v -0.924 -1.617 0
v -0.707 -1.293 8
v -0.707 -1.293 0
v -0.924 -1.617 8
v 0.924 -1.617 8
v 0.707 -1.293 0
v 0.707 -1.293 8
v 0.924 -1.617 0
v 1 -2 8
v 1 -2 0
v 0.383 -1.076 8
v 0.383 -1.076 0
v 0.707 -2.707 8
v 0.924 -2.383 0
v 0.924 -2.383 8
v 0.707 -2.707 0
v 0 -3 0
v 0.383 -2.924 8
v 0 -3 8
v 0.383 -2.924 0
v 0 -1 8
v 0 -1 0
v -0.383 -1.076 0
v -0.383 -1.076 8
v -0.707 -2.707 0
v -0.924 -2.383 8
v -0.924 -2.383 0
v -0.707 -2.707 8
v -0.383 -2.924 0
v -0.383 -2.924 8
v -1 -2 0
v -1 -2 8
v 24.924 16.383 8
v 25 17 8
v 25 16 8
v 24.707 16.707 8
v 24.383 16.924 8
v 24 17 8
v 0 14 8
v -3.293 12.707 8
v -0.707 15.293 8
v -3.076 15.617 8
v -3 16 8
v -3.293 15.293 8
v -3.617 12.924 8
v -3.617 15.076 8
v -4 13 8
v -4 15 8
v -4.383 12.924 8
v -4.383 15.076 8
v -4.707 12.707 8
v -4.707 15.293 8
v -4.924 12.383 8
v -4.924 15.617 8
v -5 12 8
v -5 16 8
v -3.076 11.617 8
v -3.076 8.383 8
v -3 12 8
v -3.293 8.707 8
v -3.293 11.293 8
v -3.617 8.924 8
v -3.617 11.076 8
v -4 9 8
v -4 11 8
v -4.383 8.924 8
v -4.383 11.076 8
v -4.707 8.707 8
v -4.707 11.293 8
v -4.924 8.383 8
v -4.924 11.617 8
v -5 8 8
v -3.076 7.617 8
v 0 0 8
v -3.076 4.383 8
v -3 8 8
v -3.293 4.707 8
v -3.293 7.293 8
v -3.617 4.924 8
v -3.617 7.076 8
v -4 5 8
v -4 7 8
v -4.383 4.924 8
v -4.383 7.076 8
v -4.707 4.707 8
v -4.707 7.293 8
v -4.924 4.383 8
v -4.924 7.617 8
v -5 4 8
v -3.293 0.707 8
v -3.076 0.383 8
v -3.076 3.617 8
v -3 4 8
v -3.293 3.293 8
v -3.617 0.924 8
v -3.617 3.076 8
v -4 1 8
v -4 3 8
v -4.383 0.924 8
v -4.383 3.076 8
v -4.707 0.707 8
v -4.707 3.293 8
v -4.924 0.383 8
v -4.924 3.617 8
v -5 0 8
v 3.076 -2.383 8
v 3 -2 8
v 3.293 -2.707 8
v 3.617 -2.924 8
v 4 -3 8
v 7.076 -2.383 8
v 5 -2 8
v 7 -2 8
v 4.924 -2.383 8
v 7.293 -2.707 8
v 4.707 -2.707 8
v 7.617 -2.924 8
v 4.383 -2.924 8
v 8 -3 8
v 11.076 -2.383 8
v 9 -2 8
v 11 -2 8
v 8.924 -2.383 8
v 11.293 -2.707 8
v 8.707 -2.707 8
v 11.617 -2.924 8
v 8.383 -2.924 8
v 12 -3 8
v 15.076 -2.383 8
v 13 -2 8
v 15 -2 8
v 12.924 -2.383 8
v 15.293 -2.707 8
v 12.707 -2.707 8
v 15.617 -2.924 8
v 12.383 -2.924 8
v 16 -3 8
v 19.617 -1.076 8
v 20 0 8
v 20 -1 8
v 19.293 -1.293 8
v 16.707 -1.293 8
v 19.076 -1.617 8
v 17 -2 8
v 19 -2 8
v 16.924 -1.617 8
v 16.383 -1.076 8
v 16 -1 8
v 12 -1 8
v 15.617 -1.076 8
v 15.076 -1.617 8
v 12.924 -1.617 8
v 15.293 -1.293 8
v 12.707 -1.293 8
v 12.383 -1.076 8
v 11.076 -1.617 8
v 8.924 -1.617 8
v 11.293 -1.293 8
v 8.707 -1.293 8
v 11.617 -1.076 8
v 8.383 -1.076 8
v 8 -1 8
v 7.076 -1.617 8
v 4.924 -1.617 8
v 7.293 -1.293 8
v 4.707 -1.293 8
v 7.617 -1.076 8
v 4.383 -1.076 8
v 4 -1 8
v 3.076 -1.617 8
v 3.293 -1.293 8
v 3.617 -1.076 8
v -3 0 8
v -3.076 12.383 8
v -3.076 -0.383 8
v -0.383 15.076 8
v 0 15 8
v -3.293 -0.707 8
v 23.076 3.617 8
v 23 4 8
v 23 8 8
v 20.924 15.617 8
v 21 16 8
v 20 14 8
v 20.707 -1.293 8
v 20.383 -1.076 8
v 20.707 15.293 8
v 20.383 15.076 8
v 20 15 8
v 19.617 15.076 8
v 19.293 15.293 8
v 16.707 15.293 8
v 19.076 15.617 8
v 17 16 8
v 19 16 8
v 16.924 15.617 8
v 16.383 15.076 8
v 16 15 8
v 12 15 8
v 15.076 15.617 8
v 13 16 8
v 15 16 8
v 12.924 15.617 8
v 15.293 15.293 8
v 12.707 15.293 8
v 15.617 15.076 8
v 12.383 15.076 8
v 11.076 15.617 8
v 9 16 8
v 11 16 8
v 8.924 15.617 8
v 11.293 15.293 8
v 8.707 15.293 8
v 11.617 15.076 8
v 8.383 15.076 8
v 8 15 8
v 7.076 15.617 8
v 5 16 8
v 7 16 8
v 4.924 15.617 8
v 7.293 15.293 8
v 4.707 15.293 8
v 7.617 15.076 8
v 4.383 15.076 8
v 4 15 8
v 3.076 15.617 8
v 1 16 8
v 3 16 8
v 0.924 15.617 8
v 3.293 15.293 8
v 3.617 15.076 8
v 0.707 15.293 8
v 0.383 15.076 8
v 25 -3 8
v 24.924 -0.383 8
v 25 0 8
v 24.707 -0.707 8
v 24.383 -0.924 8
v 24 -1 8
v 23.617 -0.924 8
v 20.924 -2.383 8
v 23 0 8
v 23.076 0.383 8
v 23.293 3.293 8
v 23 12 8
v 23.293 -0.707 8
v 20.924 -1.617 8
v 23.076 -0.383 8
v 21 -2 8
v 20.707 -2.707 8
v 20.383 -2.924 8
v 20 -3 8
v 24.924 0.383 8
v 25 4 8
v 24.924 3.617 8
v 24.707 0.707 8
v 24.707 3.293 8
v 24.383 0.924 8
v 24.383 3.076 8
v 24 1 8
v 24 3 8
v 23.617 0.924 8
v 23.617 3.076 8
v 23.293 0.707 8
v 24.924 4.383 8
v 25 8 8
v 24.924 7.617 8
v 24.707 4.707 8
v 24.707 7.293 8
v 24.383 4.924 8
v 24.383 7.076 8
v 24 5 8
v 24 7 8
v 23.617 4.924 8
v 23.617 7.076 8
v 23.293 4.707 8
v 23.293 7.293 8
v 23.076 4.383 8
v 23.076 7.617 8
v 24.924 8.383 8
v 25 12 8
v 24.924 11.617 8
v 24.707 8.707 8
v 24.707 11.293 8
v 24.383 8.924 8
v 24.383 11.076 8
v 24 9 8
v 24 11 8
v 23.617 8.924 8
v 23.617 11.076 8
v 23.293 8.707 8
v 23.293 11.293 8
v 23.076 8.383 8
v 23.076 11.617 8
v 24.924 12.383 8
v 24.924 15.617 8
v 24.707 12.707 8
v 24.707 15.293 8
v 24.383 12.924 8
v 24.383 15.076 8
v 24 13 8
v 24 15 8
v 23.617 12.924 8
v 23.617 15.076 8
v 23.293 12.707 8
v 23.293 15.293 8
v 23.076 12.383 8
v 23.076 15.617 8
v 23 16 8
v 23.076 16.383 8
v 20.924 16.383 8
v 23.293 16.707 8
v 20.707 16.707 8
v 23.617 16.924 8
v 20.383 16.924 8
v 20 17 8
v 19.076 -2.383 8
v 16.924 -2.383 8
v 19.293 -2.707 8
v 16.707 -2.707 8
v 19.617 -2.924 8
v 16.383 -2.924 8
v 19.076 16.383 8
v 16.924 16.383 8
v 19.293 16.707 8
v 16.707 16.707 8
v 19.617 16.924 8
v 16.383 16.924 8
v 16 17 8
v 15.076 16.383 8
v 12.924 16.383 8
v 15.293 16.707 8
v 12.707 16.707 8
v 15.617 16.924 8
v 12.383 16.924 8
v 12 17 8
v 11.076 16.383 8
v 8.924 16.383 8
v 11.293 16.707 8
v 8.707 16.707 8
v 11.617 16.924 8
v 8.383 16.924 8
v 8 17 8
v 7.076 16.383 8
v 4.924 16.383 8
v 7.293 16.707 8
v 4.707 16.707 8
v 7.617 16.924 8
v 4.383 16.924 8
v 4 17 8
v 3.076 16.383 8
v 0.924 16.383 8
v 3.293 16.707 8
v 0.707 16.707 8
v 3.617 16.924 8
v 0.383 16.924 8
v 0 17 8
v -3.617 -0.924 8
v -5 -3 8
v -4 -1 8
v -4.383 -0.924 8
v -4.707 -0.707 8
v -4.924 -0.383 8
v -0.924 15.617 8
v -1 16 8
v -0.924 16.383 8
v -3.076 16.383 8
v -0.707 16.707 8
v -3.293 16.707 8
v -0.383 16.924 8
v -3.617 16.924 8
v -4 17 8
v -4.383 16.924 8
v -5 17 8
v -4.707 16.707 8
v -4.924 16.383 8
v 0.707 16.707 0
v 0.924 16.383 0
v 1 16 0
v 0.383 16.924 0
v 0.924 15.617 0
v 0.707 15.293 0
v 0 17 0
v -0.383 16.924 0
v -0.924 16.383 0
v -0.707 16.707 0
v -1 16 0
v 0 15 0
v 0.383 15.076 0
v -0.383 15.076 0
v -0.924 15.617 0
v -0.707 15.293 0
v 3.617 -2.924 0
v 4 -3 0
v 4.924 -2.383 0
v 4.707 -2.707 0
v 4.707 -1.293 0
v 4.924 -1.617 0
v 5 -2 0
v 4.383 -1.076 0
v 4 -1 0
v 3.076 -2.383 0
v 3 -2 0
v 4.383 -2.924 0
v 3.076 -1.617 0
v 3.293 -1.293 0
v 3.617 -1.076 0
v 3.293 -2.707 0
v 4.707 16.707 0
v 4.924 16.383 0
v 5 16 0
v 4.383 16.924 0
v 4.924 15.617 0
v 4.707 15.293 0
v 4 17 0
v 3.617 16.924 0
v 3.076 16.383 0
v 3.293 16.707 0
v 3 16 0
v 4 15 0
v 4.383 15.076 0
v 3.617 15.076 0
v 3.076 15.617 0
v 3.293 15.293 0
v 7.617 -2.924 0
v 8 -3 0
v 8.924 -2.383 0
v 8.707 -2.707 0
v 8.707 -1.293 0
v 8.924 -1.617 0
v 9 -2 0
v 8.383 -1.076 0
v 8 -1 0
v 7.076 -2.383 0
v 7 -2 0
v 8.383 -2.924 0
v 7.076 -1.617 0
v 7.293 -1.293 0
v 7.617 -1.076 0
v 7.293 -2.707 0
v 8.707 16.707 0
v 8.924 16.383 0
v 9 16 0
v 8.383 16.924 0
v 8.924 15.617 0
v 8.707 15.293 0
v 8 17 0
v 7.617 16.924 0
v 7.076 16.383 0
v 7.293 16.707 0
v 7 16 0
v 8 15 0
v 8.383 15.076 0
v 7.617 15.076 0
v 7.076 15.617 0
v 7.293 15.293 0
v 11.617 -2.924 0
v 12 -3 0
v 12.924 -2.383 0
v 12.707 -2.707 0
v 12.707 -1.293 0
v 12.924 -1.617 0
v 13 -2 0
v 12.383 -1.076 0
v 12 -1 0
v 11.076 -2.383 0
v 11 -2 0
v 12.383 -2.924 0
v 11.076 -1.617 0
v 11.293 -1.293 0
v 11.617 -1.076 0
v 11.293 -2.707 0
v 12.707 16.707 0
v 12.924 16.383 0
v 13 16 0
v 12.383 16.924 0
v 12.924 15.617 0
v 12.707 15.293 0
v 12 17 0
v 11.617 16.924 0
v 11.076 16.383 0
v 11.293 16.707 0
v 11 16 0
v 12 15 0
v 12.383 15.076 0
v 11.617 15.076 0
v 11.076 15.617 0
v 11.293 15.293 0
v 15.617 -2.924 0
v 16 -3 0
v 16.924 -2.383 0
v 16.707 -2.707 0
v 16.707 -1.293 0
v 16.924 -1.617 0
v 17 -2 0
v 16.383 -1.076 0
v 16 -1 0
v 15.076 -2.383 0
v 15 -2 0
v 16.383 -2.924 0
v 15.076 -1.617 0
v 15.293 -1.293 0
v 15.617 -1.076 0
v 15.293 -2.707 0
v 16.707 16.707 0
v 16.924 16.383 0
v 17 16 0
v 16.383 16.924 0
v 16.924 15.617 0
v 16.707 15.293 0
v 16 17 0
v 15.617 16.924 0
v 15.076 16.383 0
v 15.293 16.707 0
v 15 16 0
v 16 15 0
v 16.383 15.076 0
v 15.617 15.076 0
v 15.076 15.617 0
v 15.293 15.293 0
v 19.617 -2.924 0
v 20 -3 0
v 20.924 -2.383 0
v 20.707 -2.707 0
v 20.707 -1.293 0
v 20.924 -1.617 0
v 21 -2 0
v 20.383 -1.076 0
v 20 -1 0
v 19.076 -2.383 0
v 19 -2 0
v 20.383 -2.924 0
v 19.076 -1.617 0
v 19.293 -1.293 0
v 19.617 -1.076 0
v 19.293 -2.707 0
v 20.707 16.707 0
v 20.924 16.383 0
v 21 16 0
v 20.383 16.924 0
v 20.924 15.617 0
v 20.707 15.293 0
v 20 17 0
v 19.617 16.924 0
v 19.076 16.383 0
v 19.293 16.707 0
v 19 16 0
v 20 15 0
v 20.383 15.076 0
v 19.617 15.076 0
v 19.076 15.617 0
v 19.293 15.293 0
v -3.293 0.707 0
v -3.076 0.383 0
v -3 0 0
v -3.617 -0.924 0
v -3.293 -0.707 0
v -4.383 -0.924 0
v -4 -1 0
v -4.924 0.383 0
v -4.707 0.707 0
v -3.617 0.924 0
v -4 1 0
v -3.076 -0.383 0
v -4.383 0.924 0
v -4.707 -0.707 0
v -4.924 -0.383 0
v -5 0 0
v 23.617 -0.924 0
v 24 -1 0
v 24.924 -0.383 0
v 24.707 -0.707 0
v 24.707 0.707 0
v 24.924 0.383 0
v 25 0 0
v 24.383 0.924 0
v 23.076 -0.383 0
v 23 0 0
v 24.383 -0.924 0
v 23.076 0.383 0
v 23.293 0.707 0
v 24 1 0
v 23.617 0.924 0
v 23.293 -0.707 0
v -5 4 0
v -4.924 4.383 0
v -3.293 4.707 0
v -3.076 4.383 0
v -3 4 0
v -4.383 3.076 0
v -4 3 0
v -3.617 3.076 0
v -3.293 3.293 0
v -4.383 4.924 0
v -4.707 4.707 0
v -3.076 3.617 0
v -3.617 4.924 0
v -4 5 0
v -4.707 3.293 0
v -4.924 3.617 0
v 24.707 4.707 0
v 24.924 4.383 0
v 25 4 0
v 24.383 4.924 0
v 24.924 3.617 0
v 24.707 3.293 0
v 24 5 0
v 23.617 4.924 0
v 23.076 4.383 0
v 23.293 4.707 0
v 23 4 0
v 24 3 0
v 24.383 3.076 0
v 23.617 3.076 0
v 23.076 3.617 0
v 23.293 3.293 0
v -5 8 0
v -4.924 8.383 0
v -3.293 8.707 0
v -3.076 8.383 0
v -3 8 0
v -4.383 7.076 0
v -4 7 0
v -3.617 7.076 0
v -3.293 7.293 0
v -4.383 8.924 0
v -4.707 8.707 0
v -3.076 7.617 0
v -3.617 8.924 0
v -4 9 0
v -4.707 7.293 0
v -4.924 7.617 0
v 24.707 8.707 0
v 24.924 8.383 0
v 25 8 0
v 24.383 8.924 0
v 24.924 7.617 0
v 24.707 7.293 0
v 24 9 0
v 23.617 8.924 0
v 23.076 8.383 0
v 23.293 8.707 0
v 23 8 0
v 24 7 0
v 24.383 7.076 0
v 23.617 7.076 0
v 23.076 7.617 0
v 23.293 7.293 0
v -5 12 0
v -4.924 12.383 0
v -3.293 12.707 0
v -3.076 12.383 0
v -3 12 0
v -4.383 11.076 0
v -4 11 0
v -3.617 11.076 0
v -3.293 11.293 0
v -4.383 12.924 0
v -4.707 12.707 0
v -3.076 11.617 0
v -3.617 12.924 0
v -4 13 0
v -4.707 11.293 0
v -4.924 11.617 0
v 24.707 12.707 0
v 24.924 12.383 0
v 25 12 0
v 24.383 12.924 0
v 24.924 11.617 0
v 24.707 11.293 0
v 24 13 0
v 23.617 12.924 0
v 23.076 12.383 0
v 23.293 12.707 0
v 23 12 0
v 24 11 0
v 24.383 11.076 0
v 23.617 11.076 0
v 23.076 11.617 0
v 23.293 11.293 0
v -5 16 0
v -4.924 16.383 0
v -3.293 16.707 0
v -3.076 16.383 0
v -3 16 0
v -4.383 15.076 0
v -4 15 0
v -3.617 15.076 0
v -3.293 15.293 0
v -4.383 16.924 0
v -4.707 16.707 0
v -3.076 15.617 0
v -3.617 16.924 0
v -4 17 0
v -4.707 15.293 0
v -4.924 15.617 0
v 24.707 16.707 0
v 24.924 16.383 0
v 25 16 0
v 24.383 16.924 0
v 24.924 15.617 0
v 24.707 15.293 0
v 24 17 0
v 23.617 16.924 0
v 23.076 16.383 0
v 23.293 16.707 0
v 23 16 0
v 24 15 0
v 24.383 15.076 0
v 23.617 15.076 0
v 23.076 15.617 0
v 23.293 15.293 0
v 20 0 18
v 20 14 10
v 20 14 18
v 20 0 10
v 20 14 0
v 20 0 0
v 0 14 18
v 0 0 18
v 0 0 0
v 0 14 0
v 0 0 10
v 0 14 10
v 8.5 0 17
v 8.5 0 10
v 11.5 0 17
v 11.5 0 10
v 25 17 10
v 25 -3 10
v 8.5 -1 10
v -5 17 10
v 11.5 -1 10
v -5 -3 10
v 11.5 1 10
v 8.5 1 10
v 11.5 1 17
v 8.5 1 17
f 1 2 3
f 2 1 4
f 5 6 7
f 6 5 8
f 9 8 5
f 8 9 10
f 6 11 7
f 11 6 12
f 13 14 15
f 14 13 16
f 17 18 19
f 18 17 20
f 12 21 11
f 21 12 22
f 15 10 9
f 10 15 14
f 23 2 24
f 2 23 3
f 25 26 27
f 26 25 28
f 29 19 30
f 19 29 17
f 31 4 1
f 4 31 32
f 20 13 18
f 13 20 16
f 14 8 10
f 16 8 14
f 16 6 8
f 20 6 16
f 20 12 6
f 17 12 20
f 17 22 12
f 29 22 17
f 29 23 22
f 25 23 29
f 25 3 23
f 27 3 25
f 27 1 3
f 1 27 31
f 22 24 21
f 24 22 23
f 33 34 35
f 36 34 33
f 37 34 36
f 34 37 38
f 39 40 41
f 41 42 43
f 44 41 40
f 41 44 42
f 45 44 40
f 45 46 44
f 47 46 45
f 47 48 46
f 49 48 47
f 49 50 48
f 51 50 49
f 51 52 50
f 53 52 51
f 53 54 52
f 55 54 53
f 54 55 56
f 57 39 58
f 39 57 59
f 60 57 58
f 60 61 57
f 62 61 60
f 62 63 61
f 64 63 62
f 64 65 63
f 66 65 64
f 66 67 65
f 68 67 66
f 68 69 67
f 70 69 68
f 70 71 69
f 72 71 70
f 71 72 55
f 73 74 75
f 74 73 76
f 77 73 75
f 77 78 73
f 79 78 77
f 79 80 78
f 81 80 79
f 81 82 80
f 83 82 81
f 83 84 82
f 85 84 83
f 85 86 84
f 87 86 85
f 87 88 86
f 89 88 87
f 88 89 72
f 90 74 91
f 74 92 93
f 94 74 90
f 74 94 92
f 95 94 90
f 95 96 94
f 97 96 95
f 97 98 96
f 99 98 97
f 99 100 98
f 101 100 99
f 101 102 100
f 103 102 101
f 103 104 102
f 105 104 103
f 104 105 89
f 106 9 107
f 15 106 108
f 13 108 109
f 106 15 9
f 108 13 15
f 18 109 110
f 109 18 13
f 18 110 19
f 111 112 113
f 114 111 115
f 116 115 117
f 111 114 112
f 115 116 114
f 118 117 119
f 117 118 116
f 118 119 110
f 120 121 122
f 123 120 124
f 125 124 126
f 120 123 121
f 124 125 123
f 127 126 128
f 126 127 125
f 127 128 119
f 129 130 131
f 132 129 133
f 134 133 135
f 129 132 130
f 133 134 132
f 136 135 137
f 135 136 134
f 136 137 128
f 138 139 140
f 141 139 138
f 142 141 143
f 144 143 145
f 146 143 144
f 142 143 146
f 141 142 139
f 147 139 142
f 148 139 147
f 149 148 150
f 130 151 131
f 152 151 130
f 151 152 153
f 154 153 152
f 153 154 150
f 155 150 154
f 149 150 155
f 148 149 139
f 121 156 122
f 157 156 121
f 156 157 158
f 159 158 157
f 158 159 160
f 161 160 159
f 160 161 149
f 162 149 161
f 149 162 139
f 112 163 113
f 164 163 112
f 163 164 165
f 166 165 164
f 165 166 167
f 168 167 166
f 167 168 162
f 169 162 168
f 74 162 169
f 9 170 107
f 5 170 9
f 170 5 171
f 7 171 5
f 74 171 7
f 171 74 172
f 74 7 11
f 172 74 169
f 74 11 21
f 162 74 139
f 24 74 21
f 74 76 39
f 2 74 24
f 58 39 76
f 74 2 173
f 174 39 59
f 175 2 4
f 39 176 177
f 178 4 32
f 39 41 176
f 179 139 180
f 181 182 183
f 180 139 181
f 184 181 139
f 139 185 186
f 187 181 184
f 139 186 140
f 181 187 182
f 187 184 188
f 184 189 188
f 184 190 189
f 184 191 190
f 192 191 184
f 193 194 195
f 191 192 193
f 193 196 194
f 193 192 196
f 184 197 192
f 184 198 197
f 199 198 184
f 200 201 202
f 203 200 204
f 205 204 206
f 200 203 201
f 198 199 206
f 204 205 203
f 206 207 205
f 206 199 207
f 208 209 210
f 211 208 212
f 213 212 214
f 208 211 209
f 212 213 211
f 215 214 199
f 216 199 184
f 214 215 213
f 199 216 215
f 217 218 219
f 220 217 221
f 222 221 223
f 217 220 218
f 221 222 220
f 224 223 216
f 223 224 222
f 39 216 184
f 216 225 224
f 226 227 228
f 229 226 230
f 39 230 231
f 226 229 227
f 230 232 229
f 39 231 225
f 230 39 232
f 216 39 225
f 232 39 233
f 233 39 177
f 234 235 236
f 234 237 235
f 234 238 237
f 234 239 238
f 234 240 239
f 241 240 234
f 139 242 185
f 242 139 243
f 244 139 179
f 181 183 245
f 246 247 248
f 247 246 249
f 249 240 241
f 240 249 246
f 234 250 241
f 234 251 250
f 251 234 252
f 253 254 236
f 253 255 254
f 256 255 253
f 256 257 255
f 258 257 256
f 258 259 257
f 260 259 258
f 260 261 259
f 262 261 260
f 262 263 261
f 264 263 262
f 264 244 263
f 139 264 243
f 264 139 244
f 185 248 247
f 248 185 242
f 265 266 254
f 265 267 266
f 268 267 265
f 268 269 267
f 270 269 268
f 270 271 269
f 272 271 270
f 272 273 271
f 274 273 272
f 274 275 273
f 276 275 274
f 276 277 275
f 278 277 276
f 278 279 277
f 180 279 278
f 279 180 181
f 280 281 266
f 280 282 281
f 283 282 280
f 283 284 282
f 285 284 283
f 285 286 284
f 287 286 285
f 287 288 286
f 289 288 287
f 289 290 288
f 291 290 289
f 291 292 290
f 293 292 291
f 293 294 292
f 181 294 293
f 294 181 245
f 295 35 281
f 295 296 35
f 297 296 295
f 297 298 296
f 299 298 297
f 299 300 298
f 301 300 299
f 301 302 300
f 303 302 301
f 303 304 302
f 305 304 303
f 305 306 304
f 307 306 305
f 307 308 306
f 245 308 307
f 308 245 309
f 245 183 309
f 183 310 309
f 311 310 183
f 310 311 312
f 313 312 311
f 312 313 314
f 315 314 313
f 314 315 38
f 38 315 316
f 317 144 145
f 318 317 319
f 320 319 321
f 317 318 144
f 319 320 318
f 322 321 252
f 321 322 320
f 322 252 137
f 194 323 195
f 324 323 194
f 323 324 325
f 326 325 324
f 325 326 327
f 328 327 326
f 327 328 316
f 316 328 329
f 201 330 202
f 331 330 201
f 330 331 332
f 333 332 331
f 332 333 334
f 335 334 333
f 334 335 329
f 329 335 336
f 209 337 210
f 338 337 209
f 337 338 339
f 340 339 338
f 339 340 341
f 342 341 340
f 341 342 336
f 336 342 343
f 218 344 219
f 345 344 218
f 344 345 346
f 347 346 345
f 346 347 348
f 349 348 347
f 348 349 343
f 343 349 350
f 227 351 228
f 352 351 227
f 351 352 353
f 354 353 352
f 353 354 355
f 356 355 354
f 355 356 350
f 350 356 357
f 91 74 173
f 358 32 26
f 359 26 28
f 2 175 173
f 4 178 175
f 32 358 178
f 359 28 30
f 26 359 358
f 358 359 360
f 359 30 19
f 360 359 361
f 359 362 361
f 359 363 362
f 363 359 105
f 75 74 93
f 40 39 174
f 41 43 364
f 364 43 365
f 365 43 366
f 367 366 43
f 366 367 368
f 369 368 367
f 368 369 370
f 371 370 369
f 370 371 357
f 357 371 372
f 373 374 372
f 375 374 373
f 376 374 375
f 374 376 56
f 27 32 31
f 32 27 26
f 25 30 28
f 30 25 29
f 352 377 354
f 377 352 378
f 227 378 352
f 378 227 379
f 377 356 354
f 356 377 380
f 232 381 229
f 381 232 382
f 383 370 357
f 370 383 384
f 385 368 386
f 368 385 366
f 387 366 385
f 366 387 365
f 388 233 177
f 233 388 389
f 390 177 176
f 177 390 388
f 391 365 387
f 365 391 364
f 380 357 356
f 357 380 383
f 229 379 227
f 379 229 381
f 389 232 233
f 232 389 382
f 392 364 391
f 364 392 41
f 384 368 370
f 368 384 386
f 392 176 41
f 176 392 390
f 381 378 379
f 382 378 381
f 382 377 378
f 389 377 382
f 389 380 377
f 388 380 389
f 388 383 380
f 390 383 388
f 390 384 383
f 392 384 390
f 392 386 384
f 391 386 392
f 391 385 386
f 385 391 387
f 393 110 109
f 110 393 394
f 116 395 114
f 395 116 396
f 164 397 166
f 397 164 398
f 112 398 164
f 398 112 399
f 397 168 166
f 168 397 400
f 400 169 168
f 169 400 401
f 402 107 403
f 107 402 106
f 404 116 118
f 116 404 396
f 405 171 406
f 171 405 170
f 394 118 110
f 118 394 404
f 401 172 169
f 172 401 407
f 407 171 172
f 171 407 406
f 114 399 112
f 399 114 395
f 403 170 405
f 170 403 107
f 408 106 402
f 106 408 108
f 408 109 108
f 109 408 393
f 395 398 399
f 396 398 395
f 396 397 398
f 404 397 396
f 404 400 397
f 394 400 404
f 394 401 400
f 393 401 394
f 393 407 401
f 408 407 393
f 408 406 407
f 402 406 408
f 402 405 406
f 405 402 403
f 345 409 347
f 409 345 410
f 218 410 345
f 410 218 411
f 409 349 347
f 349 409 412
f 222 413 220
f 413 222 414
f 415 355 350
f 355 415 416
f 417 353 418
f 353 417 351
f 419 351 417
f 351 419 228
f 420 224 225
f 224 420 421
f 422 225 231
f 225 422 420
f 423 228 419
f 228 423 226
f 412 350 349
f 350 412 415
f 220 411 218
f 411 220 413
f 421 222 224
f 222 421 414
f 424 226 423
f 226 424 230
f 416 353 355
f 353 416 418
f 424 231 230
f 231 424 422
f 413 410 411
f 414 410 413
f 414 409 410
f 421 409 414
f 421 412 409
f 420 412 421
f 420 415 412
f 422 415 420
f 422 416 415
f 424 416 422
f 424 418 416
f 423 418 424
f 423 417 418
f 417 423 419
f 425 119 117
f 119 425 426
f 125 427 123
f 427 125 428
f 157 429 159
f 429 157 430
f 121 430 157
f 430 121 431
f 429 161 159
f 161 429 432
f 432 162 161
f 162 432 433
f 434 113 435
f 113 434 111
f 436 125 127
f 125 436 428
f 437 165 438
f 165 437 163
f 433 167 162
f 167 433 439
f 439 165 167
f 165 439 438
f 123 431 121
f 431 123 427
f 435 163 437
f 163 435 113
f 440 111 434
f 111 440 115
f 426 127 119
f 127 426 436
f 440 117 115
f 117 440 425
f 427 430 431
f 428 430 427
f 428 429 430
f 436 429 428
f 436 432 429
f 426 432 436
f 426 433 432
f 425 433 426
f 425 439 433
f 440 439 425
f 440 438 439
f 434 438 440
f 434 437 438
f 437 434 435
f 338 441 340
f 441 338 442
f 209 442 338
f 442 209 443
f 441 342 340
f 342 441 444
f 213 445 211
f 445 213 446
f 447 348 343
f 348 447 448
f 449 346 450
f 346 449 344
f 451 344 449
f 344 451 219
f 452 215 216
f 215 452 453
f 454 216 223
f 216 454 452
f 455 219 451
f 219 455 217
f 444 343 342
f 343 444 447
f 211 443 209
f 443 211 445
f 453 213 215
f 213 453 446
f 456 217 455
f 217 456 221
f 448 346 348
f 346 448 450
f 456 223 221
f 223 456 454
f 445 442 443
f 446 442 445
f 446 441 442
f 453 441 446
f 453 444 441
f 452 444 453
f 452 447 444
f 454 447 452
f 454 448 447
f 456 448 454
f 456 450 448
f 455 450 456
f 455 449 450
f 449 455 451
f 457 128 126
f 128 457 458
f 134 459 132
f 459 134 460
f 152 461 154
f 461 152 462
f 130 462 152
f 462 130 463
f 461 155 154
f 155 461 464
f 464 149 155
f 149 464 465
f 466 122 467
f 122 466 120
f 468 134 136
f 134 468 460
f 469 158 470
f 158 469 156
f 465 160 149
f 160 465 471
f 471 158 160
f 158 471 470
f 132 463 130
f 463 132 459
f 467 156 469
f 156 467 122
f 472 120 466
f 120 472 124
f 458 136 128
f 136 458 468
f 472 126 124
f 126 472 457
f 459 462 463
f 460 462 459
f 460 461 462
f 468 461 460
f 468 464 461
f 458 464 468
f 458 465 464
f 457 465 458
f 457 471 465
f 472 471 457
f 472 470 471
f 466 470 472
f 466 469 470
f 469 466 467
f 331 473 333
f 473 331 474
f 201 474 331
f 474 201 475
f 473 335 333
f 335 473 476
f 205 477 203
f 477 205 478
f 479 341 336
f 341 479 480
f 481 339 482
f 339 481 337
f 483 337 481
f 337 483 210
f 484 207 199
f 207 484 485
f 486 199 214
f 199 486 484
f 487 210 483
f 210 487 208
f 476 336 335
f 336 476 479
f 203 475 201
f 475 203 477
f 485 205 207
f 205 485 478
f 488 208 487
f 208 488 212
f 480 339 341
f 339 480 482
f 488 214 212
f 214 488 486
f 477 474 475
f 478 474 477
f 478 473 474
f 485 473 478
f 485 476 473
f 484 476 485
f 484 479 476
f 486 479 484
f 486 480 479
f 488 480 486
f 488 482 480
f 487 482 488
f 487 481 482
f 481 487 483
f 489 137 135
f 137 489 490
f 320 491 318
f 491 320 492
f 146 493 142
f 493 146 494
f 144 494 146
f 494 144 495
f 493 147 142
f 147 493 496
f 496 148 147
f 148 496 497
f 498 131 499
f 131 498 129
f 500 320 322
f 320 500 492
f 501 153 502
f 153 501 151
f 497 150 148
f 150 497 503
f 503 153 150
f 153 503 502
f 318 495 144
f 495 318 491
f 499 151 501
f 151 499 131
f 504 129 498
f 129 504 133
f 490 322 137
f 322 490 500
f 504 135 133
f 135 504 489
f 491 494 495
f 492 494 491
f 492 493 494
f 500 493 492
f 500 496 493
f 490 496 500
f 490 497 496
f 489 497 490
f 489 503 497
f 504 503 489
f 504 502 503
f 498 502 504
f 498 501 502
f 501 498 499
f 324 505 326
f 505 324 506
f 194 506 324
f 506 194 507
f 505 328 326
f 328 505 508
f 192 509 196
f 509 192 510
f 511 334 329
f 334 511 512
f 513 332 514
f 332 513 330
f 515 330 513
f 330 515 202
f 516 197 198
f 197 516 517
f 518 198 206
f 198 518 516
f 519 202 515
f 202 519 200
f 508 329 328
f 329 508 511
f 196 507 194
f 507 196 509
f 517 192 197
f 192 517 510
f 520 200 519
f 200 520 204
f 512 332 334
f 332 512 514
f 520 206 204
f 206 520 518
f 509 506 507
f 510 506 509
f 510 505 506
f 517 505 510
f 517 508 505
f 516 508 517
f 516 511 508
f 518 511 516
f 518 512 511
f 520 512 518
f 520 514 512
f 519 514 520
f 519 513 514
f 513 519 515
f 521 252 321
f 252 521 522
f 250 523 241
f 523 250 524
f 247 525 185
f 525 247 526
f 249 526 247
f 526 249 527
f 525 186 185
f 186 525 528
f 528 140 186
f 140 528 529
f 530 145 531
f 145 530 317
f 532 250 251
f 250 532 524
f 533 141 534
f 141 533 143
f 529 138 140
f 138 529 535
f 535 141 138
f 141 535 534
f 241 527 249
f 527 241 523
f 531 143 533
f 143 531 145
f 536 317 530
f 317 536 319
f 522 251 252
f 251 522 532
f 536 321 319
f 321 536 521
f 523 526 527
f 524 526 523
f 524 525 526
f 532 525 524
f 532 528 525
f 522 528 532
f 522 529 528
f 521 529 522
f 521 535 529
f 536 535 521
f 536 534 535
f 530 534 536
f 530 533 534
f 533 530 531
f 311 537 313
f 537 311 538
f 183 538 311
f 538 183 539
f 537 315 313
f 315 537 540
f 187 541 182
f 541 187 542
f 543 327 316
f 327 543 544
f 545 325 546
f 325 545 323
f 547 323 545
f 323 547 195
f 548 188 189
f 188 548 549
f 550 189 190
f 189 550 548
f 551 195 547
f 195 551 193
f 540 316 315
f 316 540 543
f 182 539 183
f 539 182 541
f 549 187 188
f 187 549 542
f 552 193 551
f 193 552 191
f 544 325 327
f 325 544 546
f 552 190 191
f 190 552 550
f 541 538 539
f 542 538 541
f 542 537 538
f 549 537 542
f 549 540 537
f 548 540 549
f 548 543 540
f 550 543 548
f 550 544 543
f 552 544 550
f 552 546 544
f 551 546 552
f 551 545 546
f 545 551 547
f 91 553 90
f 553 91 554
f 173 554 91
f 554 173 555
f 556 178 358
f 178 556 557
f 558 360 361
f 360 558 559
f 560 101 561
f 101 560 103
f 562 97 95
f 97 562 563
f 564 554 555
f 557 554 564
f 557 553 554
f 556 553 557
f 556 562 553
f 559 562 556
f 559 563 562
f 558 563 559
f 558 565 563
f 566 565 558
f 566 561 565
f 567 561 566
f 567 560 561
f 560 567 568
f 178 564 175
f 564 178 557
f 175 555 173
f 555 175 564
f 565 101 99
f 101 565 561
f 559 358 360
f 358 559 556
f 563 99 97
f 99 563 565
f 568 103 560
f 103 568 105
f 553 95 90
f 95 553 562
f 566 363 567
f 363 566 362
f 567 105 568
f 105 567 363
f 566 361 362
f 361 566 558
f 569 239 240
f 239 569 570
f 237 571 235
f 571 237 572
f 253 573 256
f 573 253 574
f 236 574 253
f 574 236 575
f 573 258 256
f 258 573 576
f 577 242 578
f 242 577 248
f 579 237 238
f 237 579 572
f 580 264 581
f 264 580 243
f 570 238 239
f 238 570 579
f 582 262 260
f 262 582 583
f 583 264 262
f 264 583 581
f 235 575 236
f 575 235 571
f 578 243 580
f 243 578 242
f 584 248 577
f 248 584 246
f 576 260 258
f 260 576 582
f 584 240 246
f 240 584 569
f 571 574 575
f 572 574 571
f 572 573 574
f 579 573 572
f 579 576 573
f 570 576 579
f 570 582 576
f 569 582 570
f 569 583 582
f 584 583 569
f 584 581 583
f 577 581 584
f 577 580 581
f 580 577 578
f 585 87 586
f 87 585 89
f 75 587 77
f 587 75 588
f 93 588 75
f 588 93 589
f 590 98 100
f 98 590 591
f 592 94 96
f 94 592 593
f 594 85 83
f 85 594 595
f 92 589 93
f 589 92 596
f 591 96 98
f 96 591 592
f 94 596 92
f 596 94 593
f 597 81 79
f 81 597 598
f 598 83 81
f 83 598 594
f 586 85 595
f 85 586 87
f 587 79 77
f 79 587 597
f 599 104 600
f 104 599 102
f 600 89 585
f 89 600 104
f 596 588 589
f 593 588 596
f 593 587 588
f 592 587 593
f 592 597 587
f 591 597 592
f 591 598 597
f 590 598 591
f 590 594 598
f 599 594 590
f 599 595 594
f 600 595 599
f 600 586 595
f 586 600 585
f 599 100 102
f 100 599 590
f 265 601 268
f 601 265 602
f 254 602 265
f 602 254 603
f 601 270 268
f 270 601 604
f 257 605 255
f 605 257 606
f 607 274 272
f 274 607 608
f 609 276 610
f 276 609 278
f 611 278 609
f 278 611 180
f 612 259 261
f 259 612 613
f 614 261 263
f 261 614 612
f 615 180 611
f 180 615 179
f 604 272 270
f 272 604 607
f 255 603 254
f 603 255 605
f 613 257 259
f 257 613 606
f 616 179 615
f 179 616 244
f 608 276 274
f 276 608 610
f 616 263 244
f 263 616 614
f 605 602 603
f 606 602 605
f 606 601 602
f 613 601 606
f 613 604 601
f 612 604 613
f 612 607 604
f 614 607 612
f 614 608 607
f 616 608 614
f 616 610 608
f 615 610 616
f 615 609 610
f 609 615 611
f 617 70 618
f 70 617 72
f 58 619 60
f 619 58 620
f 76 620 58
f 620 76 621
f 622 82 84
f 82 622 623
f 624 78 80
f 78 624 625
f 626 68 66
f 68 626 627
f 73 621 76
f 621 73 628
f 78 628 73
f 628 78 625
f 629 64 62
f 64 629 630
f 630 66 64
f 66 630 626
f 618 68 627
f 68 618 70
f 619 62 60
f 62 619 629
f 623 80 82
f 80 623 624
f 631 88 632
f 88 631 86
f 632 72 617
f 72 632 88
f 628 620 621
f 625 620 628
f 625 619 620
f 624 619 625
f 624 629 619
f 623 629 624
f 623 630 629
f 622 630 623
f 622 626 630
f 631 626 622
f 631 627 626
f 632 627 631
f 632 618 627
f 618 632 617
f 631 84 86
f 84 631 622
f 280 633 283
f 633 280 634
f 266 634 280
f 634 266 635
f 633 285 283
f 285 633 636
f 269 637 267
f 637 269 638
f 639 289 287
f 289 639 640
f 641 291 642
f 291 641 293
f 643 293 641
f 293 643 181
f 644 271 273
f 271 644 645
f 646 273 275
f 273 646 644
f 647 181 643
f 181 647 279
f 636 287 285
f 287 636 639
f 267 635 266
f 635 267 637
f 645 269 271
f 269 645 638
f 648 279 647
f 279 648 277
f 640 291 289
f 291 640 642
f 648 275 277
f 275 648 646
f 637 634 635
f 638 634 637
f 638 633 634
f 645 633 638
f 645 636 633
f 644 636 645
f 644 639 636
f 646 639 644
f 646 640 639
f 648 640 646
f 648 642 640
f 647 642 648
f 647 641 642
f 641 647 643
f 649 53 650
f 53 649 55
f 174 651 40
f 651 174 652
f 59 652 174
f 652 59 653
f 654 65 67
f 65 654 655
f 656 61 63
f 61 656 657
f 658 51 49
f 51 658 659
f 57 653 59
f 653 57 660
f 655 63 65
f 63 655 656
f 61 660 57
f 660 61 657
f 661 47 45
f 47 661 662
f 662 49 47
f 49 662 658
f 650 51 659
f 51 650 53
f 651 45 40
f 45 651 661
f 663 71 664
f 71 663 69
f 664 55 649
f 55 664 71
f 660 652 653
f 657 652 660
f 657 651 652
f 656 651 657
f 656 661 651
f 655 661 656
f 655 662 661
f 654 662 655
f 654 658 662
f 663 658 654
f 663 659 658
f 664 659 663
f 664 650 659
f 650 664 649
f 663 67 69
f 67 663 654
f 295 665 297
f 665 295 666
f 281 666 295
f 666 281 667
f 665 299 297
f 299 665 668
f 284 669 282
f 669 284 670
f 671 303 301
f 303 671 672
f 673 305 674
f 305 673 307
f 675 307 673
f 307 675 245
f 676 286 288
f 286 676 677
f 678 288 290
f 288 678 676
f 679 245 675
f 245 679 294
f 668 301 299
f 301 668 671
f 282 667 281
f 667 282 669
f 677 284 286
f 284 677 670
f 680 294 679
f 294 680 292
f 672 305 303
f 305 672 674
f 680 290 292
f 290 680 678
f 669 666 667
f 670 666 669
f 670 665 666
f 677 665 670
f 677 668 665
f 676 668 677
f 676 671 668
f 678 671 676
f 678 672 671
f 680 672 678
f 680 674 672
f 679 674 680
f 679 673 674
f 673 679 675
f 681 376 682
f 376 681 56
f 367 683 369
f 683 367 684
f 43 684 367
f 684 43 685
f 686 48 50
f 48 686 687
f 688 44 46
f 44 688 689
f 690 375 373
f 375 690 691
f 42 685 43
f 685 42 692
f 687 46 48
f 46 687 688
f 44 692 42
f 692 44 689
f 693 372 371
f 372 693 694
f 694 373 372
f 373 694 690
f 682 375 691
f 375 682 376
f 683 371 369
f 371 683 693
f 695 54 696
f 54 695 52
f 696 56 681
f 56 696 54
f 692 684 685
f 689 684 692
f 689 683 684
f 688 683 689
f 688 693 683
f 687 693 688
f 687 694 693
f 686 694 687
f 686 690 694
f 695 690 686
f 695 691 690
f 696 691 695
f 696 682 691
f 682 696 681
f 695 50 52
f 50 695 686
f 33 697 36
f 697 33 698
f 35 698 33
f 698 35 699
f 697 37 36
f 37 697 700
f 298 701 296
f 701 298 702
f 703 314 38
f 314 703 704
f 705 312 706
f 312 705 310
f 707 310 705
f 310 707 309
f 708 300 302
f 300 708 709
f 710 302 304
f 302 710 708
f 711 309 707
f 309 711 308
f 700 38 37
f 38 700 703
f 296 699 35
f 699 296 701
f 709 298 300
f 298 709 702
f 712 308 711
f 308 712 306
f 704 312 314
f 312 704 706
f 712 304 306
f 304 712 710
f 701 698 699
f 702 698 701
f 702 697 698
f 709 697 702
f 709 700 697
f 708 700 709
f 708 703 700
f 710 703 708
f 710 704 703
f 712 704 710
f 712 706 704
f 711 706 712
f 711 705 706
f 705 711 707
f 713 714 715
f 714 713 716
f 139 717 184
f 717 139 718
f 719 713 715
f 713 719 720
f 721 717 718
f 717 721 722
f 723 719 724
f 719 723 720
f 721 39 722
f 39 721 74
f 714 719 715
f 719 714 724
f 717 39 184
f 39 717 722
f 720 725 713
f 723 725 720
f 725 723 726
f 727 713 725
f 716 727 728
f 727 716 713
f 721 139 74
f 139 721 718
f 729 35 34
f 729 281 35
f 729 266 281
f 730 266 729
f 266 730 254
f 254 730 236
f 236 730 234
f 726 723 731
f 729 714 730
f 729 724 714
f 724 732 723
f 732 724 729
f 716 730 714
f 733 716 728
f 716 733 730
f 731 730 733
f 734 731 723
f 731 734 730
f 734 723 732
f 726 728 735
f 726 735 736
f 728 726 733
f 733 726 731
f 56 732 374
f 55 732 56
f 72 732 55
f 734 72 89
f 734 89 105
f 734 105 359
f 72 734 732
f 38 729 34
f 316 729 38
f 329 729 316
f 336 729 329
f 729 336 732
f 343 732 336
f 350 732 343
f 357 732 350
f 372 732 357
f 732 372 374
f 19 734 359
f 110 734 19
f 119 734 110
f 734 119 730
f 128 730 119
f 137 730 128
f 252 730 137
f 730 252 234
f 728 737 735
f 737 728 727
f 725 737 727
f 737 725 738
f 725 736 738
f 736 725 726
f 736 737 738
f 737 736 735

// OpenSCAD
difference() {
	union(){
		cube([20,14,18]);
		translate([-5,-3,8]) cube([30,20,2]);
		for( i=[0:4:20] ) {
			translate([i,-2,0]) cylinder( r=1, h=8, $fn=16 );
			translate([i,16,0]) cylinder( r=1, h=8, $fn=16 );
		}
		for( i=[0:4:16] ) {
			translate([-4,i,0]) cylinder( r=1, h=8, $fn=16 );
			translate([24,i,0]) cylinder( r=1, h=8, $fn=16 );
		}
	}
	translate([10-1.5,-1,10]) cube([3,2,7]);
}
